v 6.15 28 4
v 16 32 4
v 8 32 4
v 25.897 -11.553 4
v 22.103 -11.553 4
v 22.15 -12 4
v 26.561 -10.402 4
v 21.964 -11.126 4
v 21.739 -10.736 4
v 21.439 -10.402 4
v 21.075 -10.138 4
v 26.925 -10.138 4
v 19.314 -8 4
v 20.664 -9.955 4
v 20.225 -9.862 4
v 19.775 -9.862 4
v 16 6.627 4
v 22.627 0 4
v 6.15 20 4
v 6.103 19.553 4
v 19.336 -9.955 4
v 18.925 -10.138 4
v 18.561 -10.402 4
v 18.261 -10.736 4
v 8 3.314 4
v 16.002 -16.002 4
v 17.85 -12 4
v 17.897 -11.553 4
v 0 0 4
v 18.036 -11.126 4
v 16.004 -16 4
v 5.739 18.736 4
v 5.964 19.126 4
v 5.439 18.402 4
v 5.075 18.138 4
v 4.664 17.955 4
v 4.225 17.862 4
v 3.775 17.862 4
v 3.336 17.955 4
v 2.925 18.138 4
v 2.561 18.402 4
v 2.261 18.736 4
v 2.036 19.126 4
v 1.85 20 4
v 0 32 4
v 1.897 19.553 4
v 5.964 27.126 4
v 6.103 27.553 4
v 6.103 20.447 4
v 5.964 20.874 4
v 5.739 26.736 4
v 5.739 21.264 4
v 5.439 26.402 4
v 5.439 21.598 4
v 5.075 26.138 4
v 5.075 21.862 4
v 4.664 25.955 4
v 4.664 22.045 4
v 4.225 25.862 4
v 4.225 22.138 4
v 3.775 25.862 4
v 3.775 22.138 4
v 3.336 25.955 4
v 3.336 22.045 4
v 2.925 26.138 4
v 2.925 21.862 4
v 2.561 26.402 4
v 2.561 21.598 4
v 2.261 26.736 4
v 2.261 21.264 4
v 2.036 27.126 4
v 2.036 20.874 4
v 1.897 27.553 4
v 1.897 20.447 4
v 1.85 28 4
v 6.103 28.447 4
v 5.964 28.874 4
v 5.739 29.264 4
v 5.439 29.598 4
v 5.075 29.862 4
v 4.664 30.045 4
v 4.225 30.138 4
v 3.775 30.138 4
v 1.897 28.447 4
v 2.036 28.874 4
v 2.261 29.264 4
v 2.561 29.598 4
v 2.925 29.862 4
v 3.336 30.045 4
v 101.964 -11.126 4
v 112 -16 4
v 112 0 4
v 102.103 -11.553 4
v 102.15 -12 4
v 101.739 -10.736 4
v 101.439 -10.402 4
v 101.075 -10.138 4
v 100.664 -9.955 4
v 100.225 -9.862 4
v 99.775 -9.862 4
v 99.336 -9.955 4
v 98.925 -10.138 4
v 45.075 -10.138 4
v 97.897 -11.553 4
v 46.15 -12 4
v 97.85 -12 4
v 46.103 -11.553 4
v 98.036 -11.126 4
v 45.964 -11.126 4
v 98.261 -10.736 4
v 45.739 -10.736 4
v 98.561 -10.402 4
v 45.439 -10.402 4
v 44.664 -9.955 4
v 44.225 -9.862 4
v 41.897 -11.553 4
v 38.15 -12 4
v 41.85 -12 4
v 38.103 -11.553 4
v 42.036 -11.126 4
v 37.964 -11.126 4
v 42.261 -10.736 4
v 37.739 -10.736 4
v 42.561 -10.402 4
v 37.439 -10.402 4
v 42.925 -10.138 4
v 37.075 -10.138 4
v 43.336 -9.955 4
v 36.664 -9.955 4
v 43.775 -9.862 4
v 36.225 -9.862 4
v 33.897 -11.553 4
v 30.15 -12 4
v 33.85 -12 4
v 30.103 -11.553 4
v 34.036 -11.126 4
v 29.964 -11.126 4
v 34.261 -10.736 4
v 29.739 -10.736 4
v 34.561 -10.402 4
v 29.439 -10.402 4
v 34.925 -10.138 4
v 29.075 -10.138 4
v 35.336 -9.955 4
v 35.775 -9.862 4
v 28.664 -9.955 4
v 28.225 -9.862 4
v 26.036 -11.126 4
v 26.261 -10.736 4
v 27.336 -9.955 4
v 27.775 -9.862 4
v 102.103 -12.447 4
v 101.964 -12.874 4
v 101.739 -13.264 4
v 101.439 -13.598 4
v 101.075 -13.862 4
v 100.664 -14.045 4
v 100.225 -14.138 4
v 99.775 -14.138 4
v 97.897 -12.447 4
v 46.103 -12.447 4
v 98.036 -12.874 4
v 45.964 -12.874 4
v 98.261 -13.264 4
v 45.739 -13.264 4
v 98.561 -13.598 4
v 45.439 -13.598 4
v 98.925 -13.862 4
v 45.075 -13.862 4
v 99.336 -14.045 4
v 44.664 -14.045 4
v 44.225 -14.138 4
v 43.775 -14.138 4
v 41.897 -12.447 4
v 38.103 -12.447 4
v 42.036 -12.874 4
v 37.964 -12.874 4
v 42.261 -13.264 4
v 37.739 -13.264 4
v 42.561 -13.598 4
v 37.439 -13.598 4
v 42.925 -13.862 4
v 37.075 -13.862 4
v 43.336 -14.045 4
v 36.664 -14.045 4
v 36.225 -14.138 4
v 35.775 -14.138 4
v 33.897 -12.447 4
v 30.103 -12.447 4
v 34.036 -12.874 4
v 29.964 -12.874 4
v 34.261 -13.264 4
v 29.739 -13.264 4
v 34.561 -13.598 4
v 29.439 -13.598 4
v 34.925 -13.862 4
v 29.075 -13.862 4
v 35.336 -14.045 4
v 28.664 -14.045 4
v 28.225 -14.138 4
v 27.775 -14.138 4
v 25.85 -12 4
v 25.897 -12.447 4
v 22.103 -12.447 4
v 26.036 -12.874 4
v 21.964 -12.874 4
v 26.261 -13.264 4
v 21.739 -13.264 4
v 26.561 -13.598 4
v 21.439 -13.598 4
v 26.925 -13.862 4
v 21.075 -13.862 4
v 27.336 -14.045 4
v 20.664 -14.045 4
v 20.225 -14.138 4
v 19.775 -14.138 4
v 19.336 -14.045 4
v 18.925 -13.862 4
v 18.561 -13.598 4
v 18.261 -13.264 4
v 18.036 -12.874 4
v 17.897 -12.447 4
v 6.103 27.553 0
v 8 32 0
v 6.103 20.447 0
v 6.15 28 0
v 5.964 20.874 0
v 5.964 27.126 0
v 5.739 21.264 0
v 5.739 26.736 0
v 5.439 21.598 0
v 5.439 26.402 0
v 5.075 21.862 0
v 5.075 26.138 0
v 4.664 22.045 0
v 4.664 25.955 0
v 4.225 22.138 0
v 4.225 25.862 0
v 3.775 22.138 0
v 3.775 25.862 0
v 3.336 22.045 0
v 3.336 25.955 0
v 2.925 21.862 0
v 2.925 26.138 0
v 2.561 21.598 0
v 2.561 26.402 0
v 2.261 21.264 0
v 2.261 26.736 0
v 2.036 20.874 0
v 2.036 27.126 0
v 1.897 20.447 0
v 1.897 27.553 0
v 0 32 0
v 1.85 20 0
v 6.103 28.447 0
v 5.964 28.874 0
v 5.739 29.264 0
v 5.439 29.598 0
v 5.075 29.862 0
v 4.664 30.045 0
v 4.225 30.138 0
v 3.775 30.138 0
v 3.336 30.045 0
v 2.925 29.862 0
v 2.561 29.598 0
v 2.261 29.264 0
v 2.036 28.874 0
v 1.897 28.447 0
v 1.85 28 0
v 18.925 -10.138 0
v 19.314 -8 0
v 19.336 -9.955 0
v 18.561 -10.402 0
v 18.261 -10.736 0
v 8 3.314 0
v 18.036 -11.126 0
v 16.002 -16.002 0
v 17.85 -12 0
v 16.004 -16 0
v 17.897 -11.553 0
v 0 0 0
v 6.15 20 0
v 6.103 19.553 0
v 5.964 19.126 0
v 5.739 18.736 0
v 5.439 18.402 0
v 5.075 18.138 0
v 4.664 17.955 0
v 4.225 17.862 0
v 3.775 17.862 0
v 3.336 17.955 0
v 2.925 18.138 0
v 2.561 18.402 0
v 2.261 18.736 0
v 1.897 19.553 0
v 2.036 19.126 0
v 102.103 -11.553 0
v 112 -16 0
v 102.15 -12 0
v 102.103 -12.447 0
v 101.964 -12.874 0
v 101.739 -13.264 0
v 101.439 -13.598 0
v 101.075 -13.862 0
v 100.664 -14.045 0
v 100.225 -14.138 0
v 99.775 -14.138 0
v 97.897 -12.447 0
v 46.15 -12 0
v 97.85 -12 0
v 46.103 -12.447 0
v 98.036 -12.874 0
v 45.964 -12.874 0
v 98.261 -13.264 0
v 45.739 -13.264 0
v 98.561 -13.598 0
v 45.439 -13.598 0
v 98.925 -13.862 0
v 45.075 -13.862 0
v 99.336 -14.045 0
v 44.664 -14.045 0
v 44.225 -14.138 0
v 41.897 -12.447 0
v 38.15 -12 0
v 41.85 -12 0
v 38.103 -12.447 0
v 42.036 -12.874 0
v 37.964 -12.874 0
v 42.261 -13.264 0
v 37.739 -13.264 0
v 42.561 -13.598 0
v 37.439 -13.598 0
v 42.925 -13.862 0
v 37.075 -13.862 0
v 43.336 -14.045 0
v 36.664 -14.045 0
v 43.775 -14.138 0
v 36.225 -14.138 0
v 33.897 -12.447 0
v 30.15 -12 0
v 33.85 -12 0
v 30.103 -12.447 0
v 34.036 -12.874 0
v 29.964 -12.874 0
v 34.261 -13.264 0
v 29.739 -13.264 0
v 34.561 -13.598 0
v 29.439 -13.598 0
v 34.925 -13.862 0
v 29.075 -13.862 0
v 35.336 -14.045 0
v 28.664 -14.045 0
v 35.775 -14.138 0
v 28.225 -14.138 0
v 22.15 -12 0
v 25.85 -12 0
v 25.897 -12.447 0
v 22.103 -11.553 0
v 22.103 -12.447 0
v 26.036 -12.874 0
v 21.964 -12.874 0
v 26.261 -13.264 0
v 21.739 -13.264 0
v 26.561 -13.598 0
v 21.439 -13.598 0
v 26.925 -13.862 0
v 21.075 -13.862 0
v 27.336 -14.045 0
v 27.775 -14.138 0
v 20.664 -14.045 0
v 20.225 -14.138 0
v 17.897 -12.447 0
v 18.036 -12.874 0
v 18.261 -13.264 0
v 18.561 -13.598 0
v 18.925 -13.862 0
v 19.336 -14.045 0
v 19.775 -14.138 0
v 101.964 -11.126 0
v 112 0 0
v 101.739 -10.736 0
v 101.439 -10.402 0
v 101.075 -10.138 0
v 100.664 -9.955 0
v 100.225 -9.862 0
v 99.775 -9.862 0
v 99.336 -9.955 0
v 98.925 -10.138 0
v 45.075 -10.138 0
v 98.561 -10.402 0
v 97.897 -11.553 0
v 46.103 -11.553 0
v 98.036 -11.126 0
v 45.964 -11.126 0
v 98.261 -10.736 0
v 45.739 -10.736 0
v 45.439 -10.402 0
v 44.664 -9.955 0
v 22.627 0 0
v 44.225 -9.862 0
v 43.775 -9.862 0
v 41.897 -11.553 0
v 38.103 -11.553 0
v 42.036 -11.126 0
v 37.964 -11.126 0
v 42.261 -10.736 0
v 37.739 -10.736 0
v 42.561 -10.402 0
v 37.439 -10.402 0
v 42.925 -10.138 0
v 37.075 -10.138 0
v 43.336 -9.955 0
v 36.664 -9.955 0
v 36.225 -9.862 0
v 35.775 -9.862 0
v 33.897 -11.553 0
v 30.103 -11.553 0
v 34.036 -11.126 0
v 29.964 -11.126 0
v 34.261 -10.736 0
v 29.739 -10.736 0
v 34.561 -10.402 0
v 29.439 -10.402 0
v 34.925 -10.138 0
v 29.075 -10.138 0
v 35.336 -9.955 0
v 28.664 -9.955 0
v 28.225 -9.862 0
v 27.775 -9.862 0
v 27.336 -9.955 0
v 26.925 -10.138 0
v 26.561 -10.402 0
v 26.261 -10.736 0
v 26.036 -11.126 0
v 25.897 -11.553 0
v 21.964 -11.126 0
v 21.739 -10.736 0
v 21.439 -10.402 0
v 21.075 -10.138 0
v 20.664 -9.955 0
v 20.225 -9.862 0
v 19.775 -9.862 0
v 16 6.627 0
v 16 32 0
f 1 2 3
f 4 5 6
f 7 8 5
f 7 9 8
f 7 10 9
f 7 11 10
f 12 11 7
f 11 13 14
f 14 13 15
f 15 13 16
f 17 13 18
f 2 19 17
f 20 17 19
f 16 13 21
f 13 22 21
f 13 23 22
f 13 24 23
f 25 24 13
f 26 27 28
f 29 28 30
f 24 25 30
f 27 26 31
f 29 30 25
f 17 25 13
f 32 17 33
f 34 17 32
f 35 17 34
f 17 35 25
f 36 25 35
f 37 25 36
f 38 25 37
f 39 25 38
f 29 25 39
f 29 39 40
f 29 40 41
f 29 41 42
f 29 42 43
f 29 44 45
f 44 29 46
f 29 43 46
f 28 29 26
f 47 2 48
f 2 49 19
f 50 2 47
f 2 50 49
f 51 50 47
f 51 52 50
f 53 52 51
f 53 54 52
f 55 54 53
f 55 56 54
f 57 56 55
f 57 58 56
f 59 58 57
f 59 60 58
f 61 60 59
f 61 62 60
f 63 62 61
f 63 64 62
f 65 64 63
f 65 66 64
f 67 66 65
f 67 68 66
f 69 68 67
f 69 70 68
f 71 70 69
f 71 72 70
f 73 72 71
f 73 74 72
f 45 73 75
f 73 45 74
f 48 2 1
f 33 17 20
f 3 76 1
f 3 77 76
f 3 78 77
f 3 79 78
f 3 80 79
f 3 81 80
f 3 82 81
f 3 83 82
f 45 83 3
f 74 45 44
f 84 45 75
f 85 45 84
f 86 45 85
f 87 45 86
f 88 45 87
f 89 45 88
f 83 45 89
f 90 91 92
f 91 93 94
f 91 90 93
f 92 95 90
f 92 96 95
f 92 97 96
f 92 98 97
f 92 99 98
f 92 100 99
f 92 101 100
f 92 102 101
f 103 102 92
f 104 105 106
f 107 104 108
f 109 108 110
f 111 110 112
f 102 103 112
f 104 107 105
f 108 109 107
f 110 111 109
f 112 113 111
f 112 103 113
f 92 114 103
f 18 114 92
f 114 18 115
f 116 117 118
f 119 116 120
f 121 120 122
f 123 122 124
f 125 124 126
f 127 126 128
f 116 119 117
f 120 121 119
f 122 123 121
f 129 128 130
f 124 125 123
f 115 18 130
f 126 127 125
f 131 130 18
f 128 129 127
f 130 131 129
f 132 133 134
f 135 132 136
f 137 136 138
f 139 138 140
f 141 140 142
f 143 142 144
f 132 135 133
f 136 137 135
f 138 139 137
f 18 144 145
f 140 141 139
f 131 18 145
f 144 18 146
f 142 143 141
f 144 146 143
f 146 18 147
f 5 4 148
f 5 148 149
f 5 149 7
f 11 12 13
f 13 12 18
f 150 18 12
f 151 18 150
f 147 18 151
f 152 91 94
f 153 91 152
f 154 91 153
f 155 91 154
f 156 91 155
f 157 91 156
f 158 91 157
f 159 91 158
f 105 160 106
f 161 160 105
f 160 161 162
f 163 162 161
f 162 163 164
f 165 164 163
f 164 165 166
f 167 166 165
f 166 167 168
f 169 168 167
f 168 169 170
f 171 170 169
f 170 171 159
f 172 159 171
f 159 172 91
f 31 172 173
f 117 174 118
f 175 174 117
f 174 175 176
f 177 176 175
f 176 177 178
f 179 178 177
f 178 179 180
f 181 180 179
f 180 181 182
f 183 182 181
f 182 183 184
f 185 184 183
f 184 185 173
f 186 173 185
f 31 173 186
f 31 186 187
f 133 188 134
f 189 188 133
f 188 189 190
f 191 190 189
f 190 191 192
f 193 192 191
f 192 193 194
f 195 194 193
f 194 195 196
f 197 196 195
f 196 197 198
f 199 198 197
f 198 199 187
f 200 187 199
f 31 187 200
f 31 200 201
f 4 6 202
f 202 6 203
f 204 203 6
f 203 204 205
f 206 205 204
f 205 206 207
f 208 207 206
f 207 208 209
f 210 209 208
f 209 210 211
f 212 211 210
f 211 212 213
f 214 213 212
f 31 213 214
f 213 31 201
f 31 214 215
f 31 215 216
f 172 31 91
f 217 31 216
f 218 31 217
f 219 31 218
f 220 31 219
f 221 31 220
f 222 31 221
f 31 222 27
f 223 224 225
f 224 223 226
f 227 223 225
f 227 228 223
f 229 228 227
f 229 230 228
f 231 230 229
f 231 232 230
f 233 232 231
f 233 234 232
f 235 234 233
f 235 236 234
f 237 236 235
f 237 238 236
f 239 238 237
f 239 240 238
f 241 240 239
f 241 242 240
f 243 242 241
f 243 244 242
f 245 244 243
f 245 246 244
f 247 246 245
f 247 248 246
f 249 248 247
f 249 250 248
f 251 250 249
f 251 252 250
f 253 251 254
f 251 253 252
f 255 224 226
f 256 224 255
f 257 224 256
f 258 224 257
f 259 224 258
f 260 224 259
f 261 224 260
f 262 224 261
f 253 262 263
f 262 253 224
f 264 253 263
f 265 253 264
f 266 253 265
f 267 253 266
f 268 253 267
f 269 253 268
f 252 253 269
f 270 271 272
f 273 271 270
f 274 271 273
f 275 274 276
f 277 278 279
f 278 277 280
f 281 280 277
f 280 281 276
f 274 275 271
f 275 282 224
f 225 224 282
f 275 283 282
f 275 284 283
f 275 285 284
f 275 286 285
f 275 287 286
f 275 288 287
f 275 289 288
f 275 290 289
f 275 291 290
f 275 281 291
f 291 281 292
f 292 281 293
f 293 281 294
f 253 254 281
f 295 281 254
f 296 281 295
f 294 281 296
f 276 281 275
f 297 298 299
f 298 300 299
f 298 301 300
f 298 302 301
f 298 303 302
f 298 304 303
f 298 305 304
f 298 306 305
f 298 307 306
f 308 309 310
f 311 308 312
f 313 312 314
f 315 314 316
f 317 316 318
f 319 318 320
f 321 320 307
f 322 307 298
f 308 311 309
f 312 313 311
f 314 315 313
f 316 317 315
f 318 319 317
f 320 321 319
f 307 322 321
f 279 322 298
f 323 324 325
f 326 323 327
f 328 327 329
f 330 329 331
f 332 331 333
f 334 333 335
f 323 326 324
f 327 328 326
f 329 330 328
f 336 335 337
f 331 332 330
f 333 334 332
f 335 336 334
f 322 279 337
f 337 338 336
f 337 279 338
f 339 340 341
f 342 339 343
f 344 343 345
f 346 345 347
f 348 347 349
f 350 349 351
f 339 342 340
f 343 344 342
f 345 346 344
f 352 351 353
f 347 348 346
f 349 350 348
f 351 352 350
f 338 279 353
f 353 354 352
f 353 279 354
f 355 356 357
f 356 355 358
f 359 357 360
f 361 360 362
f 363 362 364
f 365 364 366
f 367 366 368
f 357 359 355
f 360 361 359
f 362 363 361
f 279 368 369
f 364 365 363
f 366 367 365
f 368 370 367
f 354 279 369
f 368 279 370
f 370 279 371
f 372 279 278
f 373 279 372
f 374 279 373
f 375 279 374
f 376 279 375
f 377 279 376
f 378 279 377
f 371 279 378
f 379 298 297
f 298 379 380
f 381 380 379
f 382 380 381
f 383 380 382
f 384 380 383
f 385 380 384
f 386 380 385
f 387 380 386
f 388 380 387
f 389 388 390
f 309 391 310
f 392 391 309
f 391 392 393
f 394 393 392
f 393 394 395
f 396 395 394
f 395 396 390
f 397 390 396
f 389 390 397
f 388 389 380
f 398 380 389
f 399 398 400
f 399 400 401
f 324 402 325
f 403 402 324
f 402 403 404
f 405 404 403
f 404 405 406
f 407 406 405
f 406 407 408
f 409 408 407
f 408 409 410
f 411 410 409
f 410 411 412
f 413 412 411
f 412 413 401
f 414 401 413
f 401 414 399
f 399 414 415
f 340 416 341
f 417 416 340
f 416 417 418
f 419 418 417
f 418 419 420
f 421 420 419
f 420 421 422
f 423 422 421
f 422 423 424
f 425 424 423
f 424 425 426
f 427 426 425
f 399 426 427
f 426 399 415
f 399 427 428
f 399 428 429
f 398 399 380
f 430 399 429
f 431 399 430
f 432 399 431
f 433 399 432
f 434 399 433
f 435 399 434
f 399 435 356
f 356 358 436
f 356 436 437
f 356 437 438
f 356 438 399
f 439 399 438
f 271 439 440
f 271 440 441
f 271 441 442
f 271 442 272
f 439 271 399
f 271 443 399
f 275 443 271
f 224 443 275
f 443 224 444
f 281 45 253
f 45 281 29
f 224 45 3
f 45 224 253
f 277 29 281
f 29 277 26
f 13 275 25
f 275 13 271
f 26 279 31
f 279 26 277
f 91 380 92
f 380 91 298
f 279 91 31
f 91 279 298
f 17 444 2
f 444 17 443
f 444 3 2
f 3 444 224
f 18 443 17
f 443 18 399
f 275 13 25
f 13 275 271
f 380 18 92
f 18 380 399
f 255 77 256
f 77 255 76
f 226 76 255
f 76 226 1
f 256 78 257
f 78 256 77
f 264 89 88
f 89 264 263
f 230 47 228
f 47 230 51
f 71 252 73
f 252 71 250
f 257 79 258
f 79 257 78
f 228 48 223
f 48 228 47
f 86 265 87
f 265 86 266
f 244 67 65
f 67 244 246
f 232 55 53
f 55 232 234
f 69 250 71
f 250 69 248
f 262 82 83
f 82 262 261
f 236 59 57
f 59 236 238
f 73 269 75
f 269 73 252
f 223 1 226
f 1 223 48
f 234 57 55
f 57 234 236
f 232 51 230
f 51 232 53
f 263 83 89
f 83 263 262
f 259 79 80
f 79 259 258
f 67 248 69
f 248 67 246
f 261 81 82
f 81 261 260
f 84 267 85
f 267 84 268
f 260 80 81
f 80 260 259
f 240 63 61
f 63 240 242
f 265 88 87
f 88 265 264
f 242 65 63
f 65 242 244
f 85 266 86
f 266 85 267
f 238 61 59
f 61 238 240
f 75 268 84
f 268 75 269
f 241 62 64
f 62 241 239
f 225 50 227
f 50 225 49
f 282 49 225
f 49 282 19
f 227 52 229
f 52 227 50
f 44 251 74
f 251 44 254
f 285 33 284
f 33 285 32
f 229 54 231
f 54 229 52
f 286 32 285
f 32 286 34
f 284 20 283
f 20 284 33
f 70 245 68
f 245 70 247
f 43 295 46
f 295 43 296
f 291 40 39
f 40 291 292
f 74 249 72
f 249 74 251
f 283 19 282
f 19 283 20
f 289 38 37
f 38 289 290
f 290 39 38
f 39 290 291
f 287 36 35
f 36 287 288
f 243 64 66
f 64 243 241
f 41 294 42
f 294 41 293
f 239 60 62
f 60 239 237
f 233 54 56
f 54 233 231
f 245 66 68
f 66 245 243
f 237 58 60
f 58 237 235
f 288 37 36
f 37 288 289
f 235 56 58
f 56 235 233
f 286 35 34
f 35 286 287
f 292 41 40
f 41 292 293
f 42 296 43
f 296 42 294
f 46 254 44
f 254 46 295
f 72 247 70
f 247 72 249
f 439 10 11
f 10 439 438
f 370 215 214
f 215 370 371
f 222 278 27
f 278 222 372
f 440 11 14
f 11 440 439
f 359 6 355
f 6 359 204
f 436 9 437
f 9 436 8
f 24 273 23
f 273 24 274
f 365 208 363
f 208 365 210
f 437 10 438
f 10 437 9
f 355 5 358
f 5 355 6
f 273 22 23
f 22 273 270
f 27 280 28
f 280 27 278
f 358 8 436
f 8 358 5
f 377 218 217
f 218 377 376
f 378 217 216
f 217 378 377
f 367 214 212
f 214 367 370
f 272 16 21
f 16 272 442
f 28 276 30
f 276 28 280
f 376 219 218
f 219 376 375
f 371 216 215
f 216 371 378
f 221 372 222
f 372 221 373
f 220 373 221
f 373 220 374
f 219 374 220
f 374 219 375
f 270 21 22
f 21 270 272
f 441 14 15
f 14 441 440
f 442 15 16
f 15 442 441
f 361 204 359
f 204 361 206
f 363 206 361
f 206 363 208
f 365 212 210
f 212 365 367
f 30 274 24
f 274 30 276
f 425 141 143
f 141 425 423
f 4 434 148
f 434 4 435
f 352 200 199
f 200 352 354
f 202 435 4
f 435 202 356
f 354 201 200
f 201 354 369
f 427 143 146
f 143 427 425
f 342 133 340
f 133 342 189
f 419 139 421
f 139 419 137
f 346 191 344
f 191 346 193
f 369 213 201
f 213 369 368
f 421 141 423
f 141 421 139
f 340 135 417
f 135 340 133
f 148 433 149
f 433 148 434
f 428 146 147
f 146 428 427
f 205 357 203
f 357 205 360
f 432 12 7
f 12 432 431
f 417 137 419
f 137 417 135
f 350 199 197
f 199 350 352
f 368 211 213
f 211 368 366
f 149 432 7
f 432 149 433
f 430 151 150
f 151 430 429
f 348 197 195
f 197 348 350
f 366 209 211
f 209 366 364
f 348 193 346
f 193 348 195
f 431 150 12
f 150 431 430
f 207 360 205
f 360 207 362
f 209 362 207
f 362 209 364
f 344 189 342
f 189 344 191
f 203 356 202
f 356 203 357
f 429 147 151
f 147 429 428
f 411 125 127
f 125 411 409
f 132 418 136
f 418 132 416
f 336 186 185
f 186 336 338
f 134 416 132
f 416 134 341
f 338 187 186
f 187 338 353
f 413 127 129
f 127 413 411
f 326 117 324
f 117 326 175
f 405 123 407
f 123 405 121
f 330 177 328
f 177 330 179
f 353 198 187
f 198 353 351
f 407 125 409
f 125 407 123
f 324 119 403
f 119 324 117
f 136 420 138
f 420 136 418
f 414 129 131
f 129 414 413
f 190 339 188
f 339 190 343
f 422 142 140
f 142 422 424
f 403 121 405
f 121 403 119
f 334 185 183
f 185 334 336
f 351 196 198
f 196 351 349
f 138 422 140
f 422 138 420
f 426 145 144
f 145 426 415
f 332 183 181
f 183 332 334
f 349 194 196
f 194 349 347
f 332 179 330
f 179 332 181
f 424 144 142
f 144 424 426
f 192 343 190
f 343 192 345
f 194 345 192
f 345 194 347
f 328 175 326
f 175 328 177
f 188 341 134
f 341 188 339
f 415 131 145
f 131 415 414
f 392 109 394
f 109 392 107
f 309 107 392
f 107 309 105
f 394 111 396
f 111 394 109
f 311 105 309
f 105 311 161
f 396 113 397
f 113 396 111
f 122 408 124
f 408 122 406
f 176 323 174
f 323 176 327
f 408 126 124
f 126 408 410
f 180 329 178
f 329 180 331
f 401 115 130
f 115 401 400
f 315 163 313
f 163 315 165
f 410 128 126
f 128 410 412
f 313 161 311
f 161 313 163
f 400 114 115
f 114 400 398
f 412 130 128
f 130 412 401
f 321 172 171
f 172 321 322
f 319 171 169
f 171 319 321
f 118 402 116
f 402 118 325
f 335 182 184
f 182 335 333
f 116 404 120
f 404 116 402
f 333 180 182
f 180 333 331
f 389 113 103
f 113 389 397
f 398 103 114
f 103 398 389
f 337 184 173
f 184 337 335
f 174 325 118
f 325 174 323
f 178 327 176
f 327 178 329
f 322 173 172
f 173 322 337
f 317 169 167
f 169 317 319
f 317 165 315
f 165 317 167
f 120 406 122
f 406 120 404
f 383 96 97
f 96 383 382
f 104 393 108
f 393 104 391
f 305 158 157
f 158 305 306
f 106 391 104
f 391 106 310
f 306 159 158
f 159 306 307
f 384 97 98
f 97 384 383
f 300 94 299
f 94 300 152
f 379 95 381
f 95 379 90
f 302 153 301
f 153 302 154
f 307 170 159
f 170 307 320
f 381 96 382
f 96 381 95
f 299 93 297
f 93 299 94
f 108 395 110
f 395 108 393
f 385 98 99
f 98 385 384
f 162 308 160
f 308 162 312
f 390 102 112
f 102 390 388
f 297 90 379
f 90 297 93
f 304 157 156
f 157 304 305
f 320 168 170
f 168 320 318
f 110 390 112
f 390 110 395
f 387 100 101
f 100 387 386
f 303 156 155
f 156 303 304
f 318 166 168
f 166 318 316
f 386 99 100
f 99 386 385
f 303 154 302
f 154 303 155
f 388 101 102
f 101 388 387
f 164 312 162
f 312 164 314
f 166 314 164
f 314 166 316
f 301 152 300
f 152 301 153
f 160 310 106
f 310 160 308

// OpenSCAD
difference() {
// Top track guard rail. Height of part is 4mm. Holes r=2.15mm, d=4.3mm.

union() {
    // same dimensions as original track
    cube([8,32,4]);
    
    // 8cos(45)=8sin(45)~=5.6568
    translate([5.6568,5.6568,0])
    rotate([0,0,225])
    cube([8,22.63,4]);
    
    translate([16,-16,0])
    cube([96,8,4]);
    
    // adding guard rails
    // 8tan(22.5)~=3.3137
    translate([8,3.3137,0])
    cube([8,28.686,4]);
    
    translate([8,3.3137,0])
    rotate([0,0,315])
    cube([16,8,4]);
    
    translate([19.3137,-8,0])
    cube([92.6863,8,4]);
    
}
    // Holes are numbered from top to bottom, left to right
    // Hole 1
    translate([4,28,-2])
    cylinder(r=2.15,44, $fn=30);

    // Hole 2
    translate([4,20,-2])
    cylinder(r=2.15,44, $fn=30);

    // Hole 3
    translate([20,-12,-2])
    cylinder(r=2.15,45, $fn=30);

    // Hole 4
    translate([28,-12,-2])
    cylinder(r=2.15,45, $fn=30);

    // Hole 5
    translate([36,-12,-2])
    cylinder(r=2.15,45, $fn=30);

    // Hole 6
    translate([44,-12,-2])
    cylinder(r=2.15,45, $fn=30);
    
    // Hole 7
    translate([100,-12,-2])
    cylinder(r=2.15,44, $fn=30);
    
}
// base plate
// color ("blue")
// translate([-80,-160,-6])
// import("/Users/harperdaniels/Downloads/plate-2.stl");
